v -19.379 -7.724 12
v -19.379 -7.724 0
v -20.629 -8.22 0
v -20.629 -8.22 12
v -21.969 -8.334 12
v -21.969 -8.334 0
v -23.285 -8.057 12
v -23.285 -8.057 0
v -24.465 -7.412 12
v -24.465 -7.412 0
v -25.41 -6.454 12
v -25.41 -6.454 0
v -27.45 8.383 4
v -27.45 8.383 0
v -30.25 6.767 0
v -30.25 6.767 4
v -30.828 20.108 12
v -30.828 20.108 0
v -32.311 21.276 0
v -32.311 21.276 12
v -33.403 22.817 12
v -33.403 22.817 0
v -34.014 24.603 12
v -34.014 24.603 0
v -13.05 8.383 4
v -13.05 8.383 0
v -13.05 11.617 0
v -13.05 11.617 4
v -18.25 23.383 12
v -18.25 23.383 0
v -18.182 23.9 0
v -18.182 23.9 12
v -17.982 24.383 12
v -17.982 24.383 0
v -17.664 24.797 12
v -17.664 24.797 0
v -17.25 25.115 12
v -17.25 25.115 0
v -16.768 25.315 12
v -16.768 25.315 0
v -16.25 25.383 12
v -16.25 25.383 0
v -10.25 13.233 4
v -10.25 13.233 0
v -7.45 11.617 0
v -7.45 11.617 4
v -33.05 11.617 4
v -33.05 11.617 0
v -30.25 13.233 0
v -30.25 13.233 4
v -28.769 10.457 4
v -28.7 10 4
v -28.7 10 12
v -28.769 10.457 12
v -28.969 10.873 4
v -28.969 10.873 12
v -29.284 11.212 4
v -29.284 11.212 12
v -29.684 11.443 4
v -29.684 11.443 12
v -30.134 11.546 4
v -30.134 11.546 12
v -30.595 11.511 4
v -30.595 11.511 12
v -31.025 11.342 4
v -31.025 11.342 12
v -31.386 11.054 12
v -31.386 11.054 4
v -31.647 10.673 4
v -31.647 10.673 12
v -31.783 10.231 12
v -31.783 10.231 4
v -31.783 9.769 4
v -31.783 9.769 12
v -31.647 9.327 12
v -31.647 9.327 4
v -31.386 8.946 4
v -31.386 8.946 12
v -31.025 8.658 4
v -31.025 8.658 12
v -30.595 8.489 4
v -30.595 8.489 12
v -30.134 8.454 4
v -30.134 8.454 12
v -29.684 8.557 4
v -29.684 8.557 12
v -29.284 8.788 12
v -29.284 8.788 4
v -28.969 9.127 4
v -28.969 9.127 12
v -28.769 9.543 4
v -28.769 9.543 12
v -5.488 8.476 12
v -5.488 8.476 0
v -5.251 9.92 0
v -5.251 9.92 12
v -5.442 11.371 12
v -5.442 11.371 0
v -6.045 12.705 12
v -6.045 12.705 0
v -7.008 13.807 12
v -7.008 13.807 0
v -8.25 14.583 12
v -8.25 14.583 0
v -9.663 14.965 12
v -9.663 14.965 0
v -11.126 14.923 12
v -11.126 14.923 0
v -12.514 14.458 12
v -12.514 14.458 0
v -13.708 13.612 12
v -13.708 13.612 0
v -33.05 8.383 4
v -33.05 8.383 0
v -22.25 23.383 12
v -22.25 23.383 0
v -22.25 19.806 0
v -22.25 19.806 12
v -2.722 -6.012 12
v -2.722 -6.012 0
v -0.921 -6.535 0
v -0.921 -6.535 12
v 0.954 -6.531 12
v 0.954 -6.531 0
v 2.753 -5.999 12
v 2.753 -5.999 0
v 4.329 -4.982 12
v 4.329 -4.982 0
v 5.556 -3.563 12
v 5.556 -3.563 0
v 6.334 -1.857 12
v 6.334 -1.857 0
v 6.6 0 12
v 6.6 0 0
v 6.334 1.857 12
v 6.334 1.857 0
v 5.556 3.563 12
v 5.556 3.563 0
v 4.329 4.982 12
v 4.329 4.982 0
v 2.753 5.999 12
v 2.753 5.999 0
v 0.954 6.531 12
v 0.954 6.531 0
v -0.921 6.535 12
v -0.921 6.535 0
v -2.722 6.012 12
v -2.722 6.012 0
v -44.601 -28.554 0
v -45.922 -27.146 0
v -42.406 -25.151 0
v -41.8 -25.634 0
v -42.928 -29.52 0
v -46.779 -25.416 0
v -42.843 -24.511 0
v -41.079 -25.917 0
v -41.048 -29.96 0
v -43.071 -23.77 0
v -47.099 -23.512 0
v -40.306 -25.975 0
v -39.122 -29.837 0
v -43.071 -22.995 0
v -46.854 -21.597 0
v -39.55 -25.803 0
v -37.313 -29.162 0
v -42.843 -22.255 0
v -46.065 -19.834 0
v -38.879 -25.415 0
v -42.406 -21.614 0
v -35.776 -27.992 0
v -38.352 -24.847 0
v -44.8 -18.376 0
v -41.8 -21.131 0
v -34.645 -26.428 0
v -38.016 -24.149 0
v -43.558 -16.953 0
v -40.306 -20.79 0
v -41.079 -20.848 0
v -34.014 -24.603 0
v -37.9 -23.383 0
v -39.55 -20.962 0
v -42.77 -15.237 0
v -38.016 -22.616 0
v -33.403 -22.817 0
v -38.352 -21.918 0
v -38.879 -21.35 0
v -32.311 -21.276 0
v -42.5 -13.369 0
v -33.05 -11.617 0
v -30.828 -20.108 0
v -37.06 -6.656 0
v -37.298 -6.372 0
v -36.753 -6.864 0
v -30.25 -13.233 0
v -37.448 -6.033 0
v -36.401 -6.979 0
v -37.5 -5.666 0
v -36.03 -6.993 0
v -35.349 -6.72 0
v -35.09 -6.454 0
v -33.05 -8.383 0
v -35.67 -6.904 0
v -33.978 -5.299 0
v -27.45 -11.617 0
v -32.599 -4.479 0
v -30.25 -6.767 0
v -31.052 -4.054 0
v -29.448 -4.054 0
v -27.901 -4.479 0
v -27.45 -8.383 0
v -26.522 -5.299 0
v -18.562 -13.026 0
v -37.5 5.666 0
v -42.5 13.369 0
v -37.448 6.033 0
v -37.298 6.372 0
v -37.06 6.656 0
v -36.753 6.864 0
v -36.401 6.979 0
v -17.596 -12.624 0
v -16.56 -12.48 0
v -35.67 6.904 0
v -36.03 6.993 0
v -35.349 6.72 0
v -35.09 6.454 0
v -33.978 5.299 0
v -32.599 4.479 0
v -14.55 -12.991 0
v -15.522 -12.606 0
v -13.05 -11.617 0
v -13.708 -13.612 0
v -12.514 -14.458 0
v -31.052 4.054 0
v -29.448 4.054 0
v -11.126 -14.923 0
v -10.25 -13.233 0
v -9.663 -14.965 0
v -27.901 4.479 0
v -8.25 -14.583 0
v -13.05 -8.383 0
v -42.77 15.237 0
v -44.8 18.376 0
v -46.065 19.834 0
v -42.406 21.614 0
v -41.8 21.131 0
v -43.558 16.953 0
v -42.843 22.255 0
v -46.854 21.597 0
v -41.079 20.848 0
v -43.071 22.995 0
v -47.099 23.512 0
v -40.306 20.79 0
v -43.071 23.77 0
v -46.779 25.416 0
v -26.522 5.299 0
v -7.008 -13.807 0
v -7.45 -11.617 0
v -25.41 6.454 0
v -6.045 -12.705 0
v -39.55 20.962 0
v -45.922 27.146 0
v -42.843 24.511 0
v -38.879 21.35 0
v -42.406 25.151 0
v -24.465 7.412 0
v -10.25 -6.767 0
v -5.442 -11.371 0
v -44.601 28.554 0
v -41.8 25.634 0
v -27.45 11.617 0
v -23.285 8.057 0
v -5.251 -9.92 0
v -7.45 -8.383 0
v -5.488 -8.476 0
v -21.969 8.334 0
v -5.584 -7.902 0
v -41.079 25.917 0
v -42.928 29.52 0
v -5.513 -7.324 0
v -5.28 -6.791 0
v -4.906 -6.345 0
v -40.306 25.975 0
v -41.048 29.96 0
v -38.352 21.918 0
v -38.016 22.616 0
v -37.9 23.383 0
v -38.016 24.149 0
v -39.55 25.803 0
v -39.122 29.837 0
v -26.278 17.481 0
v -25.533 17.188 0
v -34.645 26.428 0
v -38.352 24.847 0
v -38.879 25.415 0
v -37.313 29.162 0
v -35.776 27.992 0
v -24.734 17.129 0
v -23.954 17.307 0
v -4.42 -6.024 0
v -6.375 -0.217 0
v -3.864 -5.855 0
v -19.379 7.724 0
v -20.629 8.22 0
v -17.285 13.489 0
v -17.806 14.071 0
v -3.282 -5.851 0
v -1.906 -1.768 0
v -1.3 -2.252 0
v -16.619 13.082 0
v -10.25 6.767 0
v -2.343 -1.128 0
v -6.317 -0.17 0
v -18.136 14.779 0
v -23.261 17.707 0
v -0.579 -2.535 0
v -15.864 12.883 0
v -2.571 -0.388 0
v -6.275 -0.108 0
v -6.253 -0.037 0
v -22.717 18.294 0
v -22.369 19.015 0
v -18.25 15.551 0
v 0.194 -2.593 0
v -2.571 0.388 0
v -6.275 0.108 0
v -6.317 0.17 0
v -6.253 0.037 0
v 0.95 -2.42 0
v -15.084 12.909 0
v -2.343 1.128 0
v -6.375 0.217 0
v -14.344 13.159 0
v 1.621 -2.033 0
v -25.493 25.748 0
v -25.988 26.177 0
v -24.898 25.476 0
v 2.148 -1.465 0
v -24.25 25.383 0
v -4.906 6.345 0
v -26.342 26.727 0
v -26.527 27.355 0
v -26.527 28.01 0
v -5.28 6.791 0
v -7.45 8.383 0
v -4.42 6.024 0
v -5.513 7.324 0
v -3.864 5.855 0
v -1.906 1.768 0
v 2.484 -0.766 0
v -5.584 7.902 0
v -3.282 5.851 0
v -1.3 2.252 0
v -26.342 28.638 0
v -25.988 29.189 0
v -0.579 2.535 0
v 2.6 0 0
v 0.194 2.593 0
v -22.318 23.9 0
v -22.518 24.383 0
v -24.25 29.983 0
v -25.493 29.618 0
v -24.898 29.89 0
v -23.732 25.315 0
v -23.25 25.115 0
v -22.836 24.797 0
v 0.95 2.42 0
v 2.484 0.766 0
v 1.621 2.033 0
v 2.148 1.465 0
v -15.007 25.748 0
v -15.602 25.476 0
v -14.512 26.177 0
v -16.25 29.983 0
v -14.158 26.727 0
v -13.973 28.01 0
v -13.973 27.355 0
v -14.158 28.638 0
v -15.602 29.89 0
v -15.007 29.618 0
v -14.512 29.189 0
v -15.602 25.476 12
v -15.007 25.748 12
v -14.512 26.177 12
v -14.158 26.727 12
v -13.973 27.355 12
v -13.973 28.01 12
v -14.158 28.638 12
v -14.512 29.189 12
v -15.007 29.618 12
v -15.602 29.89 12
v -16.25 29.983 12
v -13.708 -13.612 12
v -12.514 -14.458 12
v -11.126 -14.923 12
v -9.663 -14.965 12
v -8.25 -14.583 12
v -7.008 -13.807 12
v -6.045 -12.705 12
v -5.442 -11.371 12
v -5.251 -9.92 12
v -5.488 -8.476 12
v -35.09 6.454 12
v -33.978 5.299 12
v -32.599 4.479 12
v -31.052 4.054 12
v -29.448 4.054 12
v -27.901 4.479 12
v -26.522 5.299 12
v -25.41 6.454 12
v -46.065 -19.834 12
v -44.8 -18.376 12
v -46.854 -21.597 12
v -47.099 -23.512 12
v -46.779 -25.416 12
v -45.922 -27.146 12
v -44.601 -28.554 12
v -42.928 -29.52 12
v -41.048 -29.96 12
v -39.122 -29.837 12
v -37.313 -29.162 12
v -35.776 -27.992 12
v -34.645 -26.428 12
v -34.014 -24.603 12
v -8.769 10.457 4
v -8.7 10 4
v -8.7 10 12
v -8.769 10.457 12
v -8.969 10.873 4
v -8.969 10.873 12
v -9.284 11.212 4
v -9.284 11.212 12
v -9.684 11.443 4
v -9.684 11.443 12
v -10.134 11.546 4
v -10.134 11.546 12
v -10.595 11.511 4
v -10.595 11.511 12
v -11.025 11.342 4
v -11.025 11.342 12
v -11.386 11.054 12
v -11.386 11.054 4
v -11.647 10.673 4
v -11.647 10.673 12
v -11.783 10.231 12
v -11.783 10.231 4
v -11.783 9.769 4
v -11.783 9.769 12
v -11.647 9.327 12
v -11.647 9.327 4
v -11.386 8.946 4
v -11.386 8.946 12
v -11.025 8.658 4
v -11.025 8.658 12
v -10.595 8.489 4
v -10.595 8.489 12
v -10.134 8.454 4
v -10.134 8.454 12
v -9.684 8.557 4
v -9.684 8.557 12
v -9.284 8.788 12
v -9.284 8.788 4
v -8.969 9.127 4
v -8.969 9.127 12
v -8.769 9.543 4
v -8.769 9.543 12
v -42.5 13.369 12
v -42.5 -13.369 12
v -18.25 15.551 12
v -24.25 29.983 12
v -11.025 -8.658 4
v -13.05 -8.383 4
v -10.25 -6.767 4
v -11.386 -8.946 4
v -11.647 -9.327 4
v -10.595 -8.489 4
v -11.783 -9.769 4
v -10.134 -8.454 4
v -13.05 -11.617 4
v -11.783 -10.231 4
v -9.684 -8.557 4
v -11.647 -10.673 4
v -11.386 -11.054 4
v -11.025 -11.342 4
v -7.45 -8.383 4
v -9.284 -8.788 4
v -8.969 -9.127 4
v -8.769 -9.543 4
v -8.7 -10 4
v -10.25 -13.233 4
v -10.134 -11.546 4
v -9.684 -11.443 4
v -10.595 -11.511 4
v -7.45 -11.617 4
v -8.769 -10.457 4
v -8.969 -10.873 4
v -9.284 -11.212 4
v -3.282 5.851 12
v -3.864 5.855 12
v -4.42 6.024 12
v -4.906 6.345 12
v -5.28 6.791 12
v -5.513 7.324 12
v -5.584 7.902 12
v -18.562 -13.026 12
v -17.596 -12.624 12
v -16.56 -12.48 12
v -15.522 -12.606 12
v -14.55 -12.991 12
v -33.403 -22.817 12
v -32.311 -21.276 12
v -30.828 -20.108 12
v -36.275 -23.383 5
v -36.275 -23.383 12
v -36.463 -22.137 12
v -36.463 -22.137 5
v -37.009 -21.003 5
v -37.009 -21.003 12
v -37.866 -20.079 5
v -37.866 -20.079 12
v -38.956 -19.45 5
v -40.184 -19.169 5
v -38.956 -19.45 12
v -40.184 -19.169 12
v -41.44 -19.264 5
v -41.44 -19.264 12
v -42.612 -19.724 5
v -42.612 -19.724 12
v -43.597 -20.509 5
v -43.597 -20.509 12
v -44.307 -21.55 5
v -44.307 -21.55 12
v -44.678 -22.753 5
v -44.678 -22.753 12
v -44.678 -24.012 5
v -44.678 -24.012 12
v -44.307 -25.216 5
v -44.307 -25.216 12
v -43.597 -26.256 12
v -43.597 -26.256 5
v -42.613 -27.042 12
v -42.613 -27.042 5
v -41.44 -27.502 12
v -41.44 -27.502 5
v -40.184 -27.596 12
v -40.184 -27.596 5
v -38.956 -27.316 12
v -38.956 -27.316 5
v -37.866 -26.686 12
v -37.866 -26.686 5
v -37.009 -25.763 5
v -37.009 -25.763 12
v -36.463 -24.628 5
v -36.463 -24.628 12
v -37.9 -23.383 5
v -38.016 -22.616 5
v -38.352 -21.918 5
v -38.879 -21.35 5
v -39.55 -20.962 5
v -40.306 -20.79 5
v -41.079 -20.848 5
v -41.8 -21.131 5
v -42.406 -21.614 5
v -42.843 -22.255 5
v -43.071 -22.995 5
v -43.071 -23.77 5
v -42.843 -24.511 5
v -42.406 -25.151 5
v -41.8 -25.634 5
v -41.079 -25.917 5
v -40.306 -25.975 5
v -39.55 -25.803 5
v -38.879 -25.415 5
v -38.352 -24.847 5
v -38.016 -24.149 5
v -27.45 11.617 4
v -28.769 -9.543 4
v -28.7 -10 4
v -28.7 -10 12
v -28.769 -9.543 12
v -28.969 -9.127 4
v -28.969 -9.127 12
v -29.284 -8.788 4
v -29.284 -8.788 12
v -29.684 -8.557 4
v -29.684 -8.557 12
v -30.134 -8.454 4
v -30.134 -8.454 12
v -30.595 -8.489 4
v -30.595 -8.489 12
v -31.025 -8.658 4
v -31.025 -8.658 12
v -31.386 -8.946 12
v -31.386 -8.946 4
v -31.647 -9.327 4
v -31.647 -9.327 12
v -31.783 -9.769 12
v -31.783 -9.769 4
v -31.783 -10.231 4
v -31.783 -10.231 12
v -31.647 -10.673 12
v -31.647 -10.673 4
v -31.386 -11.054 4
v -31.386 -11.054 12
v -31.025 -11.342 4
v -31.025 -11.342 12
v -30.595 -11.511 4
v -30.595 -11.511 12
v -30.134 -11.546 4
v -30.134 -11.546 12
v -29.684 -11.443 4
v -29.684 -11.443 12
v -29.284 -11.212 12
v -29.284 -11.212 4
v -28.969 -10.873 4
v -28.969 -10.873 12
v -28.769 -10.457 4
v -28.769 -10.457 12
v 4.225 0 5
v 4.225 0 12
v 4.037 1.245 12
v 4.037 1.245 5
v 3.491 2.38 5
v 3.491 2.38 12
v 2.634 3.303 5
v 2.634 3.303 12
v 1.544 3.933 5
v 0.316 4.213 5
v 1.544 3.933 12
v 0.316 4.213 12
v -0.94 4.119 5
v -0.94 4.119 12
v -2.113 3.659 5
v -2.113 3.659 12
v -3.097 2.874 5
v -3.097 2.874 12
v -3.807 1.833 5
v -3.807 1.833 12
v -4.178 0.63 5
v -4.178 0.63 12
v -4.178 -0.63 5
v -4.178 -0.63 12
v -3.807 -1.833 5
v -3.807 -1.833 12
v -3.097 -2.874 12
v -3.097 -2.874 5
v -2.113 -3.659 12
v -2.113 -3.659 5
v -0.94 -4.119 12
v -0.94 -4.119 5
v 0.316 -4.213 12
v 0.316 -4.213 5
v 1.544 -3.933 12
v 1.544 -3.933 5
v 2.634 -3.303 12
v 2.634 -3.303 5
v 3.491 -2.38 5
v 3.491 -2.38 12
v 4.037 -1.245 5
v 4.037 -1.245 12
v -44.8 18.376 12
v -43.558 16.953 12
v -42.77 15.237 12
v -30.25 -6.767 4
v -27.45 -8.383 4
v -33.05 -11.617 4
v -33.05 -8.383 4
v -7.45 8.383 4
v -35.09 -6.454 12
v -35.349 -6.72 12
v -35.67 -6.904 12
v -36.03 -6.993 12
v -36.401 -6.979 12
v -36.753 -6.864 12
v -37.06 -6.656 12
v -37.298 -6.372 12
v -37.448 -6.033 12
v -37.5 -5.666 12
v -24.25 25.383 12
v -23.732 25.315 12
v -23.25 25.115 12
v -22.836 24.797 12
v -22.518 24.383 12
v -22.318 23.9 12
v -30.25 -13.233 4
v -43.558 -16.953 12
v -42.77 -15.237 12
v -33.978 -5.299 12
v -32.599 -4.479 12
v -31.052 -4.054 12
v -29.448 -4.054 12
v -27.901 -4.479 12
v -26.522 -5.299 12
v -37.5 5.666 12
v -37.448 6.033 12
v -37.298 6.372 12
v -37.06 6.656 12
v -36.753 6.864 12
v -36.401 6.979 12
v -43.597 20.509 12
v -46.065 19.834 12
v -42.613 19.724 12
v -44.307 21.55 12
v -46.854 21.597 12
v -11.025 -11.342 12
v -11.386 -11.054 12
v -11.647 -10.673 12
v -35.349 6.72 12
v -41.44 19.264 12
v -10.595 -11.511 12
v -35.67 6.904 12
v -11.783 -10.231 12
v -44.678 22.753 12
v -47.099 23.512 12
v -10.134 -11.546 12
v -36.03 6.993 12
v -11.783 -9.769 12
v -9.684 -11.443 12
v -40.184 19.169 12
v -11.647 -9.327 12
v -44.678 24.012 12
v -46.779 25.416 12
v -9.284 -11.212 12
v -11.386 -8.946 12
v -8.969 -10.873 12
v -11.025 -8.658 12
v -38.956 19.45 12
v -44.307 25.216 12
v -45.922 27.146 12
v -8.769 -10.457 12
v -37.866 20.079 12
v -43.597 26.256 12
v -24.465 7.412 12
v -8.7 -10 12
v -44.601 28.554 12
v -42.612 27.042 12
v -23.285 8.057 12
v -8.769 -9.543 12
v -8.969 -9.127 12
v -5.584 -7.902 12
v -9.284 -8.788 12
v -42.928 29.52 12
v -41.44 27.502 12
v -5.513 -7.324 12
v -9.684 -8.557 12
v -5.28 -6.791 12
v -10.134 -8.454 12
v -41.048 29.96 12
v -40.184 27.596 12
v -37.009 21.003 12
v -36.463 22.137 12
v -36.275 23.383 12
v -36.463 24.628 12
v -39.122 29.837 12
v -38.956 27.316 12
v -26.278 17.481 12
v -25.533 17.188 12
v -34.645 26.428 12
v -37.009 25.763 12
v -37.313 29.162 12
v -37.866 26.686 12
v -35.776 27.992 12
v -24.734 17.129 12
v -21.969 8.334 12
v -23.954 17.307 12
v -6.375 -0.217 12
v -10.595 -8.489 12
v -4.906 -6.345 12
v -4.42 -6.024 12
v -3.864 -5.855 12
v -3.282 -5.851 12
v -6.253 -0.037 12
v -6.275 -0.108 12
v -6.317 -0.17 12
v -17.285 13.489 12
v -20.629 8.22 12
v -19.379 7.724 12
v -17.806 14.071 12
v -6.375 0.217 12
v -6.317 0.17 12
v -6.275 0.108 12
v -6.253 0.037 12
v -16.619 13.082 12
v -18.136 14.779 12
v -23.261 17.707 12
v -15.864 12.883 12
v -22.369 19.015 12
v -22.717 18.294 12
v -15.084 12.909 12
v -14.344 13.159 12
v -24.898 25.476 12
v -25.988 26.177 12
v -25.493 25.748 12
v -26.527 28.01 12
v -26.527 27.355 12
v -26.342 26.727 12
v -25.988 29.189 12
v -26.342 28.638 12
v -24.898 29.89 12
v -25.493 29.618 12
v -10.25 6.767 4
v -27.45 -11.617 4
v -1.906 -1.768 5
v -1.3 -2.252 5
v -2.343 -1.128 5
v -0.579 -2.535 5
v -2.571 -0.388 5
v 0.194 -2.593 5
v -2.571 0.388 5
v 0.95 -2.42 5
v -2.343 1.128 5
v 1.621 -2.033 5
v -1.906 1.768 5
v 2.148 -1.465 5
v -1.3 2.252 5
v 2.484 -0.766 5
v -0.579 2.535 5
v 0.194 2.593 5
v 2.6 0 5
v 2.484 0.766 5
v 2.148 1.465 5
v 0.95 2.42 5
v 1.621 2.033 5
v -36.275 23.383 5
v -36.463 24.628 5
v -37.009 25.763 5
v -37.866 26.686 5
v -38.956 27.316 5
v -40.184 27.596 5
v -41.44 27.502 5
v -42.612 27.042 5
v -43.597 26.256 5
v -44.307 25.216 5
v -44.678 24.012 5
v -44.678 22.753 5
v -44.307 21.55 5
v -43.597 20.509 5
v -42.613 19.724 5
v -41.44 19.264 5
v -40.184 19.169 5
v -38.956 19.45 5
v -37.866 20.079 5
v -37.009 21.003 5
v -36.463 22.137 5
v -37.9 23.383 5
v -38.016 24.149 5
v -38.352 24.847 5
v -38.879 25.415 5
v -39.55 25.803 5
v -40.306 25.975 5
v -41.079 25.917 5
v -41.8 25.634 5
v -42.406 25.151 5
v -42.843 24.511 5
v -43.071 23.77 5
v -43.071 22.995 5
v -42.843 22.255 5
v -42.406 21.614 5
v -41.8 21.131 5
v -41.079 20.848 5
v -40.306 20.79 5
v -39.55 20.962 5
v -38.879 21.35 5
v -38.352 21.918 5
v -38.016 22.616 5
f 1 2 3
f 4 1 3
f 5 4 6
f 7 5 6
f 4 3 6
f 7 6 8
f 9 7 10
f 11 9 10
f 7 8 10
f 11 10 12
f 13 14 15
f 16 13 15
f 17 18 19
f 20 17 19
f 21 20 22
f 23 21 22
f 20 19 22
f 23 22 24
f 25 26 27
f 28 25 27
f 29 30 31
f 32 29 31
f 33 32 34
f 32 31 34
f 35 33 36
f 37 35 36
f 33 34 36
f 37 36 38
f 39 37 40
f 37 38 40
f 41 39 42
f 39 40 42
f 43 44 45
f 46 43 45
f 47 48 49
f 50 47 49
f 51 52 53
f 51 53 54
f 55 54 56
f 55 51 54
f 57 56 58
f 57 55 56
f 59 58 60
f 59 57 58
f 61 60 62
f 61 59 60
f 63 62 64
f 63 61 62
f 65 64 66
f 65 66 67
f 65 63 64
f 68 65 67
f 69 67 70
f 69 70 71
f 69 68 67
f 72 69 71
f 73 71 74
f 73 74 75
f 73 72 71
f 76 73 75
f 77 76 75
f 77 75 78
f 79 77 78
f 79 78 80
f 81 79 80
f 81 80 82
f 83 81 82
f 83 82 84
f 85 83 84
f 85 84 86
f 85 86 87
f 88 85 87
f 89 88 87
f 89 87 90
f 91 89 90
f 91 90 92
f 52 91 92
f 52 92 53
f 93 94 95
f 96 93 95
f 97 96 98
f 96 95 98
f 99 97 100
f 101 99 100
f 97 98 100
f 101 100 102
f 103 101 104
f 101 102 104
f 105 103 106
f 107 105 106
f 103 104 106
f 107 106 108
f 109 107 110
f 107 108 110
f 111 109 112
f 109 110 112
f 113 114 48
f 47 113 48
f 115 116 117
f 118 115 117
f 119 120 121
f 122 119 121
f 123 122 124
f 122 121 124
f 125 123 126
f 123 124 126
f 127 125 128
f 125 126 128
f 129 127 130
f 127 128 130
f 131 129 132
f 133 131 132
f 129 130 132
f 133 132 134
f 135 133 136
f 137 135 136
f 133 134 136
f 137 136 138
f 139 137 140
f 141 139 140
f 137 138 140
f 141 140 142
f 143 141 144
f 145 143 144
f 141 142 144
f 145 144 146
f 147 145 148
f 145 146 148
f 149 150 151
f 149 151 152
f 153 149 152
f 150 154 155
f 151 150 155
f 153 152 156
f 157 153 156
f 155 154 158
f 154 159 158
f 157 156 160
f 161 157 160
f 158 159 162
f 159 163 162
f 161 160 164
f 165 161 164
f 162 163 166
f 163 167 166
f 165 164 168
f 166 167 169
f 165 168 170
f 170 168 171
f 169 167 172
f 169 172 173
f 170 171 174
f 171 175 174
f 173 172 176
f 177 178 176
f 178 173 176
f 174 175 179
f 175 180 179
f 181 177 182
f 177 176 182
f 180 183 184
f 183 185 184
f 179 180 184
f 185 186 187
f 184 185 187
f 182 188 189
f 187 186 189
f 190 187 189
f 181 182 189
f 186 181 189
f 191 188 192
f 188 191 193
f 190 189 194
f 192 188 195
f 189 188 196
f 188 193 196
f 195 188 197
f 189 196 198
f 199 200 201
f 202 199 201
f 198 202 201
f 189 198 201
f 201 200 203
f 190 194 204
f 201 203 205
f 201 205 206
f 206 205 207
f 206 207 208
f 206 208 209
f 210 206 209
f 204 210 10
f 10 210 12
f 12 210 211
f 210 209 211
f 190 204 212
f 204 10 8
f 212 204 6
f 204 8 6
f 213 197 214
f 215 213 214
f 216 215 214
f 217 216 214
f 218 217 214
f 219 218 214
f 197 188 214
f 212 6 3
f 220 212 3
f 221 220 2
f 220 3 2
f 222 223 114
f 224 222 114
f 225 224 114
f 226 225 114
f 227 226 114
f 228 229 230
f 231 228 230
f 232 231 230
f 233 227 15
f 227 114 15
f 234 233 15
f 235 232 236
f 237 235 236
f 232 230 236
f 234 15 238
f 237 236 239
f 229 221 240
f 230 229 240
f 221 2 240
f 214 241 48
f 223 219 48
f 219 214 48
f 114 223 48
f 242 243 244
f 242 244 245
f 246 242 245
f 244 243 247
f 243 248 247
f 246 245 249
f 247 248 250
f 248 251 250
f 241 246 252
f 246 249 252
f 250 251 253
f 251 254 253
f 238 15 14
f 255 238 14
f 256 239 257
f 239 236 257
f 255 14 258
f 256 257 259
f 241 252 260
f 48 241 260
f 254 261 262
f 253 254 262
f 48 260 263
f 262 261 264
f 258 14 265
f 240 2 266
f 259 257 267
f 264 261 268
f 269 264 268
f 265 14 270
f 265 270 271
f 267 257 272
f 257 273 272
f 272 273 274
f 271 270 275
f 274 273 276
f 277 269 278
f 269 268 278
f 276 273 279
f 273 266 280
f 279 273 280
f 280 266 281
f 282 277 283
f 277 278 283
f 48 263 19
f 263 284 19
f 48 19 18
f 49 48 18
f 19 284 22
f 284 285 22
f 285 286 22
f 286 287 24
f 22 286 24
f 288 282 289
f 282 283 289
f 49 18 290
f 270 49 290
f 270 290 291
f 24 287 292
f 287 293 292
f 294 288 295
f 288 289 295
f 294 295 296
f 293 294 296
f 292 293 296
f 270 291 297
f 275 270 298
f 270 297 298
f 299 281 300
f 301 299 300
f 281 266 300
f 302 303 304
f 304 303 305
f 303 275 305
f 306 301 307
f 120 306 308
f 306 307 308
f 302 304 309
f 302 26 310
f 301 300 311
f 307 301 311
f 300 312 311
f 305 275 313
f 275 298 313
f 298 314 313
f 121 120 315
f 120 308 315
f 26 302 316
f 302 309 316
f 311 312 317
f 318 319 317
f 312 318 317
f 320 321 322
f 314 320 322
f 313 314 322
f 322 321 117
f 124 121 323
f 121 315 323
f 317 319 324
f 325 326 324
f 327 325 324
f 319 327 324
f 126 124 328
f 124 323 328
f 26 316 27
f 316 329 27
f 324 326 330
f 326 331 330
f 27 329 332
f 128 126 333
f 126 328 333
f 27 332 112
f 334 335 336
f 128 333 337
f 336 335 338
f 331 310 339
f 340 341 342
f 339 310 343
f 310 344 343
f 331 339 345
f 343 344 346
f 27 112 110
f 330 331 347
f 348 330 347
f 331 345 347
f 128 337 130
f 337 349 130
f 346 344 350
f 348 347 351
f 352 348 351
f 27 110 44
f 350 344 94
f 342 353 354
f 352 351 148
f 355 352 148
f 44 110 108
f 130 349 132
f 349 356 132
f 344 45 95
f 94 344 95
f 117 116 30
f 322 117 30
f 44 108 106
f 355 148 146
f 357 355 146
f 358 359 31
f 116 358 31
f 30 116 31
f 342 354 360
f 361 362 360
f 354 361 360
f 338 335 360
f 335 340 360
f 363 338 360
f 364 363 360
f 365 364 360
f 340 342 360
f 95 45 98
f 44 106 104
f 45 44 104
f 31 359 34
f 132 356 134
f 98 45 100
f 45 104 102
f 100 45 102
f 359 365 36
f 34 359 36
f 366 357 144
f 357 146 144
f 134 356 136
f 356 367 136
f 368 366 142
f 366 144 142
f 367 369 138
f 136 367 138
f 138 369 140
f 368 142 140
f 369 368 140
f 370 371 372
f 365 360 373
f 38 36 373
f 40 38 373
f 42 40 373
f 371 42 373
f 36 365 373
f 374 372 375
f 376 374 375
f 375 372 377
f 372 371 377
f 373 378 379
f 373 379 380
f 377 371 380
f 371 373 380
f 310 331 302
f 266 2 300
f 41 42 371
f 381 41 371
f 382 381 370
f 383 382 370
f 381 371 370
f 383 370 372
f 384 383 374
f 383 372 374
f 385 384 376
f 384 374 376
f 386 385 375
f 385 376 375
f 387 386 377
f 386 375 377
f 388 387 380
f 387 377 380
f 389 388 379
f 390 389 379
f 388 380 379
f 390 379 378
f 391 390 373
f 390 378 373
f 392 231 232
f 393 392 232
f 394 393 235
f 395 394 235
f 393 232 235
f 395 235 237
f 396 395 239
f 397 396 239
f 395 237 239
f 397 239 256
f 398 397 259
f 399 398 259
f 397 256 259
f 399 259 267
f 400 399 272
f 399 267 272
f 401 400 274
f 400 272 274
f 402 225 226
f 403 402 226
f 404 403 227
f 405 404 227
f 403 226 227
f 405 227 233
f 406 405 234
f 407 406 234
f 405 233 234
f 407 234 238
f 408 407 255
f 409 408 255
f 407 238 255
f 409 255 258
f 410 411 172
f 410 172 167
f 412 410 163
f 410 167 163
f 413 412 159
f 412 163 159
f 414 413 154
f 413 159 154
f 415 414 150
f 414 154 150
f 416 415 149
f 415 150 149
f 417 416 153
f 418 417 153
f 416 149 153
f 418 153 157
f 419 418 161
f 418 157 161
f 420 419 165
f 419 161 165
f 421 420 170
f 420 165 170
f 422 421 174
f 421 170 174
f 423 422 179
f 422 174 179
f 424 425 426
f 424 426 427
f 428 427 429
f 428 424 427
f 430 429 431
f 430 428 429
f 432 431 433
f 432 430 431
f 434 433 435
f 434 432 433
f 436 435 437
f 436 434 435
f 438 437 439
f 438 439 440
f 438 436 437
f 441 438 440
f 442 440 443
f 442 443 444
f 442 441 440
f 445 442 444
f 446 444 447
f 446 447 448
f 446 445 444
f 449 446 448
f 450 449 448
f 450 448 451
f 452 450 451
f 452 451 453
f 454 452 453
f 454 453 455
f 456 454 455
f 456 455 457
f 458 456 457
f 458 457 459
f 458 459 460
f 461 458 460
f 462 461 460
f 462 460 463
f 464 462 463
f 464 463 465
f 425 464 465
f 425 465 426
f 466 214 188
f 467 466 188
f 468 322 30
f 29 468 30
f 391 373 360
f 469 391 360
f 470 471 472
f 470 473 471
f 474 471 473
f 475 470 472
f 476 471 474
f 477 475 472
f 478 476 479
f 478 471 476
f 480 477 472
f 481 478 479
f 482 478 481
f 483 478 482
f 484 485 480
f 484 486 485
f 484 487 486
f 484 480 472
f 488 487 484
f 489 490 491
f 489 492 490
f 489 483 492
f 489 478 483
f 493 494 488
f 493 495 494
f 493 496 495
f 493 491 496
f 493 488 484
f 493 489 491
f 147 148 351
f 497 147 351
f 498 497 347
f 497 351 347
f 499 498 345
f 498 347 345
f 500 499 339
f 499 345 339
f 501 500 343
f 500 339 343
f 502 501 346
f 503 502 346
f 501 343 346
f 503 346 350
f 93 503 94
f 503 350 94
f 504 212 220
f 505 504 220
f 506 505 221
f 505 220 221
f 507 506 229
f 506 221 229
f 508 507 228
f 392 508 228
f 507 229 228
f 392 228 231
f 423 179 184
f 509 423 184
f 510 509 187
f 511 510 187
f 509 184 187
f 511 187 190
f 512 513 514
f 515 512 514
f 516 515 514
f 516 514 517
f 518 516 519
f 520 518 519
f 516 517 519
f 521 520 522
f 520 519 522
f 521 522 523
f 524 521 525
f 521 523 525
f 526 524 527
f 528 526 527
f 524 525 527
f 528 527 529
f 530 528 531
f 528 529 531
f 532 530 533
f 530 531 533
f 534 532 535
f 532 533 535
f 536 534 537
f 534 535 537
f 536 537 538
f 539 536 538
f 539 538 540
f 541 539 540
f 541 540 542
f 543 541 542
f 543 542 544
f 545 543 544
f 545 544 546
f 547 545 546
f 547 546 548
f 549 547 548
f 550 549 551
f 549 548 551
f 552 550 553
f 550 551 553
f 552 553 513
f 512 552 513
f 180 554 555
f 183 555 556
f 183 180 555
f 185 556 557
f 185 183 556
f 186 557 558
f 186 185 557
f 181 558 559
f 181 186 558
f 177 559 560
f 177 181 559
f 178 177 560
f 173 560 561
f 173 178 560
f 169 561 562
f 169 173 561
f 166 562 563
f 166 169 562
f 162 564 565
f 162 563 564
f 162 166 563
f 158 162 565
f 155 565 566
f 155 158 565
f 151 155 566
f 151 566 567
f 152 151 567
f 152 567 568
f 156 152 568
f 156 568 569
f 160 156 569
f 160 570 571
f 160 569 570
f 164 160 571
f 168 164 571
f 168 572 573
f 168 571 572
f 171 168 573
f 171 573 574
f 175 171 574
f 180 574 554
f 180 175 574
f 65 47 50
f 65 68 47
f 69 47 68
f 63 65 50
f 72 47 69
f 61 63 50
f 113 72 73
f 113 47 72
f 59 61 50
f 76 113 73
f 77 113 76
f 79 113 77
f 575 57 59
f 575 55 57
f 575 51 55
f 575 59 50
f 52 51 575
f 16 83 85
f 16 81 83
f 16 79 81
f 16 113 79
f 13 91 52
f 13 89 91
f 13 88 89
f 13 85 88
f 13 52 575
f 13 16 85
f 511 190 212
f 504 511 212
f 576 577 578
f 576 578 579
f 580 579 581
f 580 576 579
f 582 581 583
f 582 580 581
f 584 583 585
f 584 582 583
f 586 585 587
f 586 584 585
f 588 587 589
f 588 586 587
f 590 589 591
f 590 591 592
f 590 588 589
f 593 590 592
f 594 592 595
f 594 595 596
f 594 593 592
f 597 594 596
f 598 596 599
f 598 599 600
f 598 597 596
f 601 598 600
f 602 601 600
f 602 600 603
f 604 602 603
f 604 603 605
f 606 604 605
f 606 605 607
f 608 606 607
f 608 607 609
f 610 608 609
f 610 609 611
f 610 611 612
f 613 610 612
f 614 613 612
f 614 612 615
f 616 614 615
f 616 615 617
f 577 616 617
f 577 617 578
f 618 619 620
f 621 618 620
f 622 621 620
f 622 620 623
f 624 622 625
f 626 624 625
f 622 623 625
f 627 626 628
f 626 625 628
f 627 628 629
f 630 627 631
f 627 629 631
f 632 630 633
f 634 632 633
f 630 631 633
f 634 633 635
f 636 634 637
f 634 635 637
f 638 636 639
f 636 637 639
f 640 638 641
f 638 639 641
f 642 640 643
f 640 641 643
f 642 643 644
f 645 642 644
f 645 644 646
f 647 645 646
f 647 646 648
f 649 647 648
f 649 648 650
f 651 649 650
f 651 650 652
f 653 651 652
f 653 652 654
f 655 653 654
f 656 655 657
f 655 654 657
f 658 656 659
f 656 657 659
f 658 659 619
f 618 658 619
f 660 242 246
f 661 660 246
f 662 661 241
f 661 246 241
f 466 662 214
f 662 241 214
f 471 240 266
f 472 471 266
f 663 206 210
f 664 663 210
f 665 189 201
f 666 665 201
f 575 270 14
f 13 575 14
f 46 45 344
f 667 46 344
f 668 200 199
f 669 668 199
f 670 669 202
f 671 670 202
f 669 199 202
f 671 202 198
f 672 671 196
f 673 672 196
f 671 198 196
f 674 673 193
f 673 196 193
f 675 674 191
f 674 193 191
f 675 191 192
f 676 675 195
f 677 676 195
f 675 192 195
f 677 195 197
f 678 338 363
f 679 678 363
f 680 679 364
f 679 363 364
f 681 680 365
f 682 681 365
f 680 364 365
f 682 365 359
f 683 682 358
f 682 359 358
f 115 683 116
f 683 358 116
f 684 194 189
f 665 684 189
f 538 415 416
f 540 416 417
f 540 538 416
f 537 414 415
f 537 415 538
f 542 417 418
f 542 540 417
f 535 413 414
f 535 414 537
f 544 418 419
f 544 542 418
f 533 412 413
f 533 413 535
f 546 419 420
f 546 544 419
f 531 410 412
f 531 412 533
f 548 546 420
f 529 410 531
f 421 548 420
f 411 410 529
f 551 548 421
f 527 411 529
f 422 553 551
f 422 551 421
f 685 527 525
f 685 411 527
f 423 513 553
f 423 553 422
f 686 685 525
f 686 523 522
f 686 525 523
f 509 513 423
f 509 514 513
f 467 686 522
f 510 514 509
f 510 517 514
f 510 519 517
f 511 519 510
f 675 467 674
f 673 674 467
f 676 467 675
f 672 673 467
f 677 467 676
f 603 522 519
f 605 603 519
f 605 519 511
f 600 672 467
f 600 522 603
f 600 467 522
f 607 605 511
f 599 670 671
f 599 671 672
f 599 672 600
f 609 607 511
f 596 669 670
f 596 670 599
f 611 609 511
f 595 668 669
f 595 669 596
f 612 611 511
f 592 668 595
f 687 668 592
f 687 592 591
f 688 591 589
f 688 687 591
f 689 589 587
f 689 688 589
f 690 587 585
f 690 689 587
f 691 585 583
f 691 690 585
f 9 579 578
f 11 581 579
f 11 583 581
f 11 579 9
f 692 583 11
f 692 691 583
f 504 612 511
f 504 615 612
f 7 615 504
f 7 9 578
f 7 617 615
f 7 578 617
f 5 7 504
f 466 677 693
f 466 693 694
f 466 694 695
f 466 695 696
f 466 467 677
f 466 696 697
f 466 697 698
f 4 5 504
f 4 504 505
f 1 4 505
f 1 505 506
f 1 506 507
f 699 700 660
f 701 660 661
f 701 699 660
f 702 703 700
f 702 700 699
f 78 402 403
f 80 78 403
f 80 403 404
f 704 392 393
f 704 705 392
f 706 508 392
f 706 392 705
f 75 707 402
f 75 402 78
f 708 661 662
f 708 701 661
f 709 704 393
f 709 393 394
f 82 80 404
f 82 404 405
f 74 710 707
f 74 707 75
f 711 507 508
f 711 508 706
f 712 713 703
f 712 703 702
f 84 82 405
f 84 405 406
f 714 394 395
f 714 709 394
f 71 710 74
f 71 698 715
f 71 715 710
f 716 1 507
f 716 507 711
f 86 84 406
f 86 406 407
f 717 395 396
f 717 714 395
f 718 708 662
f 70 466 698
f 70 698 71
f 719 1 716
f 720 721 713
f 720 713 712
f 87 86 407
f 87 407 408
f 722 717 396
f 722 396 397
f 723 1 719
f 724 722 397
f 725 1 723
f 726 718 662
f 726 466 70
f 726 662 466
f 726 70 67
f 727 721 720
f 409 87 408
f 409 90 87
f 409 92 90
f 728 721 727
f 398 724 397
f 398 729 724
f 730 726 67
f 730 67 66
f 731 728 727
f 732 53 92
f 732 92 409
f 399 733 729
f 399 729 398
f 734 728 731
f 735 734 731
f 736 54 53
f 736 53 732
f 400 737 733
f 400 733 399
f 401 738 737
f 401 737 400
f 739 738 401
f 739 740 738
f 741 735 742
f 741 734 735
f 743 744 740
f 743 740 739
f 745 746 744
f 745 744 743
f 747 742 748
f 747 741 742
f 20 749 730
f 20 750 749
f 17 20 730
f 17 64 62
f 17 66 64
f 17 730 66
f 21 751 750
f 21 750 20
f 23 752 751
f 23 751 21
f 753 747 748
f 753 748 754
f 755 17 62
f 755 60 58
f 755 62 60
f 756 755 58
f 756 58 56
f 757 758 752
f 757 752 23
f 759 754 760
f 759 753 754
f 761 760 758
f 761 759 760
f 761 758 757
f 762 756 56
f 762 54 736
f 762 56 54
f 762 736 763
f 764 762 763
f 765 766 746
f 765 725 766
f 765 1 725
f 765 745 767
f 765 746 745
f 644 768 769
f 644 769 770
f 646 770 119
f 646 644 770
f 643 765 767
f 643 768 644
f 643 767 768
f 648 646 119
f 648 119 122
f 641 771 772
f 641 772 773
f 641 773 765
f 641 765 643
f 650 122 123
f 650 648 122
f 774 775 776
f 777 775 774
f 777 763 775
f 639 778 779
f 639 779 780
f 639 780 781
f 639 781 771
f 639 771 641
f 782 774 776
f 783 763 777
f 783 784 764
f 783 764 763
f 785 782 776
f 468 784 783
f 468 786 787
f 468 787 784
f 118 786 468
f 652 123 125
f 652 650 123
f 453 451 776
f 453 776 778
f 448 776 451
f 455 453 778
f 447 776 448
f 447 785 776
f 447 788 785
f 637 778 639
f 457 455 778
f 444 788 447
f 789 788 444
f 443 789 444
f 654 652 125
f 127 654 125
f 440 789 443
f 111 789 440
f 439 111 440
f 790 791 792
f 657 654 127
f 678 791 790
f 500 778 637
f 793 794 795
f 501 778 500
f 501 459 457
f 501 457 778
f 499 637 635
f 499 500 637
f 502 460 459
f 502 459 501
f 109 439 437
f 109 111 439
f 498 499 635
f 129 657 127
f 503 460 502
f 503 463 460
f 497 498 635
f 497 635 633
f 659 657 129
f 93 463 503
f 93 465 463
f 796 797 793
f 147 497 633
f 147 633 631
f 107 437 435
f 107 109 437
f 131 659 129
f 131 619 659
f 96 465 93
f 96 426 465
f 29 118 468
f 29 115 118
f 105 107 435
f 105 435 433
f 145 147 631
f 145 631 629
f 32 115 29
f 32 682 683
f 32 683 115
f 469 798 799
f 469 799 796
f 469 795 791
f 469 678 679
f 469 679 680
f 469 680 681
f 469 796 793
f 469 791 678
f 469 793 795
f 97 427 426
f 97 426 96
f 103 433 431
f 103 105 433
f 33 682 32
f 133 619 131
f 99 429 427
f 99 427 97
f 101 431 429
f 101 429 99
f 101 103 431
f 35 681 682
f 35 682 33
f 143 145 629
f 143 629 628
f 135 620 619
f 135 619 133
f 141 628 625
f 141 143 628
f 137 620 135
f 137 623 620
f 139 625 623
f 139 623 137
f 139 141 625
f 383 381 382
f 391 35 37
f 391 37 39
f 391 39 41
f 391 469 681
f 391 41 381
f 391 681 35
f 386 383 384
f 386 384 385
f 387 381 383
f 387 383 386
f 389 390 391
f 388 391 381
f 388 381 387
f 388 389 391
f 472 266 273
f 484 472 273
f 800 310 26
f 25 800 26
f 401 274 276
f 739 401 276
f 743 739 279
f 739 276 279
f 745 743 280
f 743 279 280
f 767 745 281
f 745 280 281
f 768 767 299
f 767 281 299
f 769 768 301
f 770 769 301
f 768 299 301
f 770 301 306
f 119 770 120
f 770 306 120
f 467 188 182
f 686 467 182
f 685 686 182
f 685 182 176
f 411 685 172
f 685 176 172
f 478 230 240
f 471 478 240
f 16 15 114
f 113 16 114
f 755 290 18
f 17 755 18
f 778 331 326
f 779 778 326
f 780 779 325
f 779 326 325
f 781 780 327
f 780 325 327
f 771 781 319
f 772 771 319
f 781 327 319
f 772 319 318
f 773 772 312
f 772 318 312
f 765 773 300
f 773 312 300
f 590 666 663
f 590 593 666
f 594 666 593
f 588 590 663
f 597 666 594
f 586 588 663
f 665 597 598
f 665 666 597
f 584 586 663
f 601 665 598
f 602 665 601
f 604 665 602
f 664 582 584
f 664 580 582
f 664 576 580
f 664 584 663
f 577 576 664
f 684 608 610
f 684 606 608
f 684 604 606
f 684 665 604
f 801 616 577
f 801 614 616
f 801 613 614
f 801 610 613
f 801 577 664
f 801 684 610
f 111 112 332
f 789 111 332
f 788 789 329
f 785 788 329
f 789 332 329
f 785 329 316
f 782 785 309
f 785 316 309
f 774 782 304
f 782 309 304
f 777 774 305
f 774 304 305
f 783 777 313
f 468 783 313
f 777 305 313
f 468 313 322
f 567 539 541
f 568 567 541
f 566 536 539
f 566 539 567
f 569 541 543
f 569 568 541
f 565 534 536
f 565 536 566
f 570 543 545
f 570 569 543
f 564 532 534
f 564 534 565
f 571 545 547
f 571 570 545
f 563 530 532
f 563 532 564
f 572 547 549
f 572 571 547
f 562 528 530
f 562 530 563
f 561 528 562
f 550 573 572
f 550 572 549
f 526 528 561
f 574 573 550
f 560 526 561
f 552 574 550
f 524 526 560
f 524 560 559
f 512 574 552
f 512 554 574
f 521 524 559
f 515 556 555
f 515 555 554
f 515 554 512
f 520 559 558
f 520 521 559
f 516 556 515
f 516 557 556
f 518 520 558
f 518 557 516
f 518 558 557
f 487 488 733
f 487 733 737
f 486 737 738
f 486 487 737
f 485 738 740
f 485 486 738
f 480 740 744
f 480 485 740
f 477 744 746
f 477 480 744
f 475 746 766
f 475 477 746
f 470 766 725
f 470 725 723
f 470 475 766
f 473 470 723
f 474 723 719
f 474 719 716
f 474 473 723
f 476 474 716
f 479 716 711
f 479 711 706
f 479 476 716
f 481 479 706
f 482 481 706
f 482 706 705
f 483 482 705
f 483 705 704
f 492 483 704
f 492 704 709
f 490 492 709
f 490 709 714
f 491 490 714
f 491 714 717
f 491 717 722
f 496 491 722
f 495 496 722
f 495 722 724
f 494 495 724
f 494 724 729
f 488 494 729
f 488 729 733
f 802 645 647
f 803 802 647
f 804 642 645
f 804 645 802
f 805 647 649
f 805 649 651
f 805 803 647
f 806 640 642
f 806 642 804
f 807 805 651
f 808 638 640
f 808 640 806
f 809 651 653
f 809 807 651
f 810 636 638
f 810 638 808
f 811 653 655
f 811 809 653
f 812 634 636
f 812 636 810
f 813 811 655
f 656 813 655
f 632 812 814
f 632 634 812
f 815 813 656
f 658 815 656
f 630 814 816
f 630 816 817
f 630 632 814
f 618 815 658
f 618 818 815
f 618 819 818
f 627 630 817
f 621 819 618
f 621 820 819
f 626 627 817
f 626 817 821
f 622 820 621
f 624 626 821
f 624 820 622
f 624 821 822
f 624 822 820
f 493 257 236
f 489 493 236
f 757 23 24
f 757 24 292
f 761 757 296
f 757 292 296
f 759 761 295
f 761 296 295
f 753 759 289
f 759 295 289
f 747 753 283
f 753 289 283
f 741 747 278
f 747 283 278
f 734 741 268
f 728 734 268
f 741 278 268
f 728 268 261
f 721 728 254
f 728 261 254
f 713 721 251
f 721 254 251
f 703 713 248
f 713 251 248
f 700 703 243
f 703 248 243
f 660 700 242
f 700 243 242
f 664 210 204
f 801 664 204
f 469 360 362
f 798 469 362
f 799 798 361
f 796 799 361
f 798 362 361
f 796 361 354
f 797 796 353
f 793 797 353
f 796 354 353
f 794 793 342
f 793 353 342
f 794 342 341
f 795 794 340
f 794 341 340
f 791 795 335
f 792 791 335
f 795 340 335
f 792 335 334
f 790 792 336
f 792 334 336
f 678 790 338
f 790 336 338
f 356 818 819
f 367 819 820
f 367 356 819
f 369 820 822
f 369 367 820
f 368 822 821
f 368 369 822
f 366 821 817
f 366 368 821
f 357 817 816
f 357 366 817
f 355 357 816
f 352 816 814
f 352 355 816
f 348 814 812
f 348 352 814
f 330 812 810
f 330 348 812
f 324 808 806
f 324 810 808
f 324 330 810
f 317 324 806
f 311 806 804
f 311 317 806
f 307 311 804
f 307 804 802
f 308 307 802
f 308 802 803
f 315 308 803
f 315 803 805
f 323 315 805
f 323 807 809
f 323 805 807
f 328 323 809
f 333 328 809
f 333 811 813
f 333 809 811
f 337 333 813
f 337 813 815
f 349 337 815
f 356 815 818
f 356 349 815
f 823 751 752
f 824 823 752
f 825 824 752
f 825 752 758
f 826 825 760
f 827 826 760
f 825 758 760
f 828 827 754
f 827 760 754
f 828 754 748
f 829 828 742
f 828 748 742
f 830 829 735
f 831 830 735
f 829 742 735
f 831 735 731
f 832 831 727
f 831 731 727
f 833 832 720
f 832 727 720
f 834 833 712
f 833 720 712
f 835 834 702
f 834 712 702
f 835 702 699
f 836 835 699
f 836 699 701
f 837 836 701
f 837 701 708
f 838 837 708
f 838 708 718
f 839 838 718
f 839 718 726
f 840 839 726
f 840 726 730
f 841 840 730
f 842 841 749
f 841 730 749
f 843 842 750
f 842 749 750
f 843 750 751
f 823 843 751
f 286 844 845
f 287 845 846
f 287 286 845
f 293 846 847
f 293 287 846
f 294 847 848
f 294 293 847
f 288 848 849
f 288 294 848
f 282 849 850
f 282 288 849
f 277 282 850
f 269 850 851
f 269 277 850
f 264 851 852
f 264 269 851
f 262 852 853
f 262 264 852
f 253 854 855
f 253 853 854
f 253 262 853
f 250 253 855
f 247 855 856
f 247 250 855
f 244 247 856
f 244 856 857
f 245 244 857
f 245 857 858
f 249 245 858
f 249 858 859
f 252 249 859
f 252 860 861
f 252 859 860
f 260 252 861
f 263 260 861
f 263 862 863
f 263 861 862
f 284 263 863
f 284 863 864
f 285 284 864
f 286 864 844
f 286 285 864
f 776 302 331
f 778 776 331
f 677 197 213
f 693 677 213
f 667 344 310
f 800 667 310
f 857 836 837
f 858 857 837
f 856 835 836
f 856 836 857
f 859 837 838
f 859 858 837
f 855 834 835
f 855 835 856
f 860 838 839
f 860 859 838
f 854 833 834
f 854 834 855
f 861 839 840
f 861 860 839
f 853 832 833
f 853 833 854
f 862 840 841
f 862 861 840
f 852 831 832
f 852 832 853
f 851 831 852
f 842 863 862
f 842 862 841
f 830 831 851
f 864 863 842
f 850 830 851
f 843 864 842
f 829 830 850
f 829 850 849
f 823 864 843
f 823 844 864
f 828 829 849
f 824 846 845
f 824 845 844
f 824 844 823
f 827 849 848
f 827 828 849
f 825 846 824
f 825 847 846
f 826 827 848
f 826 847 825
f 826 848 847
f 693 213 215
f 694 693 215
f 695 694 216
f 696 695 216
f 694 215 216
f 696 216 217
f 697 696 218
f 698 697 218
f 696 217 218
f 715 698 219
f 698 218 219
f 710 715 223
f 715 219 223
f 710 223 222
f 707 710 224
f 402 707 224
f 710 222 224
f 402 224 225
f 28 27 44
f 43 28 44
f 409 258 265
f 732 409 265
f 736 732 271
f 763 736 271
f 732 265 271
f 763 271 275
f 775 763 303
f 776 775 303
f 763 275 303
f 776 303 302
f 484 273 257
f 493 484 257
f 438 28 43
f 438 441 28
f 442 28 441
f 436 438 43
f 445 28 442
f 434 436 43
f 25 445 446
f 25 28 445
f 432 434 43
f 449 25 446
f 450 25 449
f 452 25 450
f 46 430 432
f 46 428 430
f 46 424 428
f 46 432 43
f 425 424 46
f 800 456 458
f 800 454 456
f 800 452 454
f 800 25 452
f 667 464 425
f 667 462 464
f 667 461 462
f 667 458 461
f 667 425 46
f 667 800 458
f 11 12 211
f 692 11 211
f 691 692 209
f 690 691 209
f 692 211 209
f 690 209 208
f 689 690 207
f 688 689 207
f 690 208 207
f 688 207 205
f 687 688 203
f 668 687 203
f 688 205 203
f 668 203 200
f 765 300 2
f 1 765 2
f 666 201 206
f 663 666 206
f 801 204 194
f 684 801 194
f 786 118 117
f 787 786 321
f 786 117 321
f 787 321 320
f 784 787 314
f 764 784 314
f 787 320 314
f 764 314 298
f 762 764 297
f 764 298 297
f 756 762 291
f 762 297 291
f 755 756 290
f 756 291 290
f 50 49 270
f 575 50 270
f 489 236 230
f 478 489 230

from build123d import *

# Parameters (mm, degrees)
F0_R     = 2.6
F0_R_2   = 1.55
F1_DEPTH = 12
F2_R     = 4.225
F3_DEPTH = 7
F5_DEPTH = 4


with BuildPart() as f1:
    # F0 (on Top) → F1 (new body)
    with BuildSketch(Plane.XY):
        with BuildLine():
            ThreePointArc((-30.82763, 20.107742), (-32.912276, 22.00702), (-34.013815, 24.603098))
            ThreePointArc((-34.013815, 24.603098), (-43.8, 29.098454), (-44.8, 18.375691))
            ThreePointArc((-44.8, 18.375691), (-43.102501, 16.123691), (-42.5, 13.368696))
            Line((-42.5, 13.368696), (-42.5, -13.368696))
            ThreePointArc((-42.5, -13.368696), (-43.102501, -16.123691), (-44.8, -18.375691))
            ThreePointArc((-44.8, -18.375691), (-43.8, -29.098454), (-34.013815, -24.603098))
            ThreePointArc((-34.013815, -24.603098), (-32.912276, -22.00702), (-30.82763, -20.107742))
            Line((-30.82763, -20.107742), (-18.561811, -13.026067))
            ThreePointArc((-18.561811, -13.026067), (-16.037247, -12.509627), (-13.707877, -13.611522))
            ThreePointArc((-13.707877, -13.611522), (-7.600624, -14.240378), (-5.487994, -8.475762))
            ThreePointArc((-5.487994, -8.475762), (-4.905969, -6.345122), (-2.722478, -6.01233))
            ThreePointArc((-2.722478, -6.01233), (6.6, 0), (-2.722478, 6.01233))
            ThreePointArc((-2.722478, 6.01233), (-4.905969, 6.345122), (-5.487994, 8.475762))
            ThreePointArc((-5.487994, 8.475762), (-7.600624, 14.240378), (-13.707877, 13.611522))
            ThreePointArc((-13.707877, 13.611522), (-16.619309, 13.081574), (-18.25, 15.551013))
            Line((-18.25, 15.551013), (-18.25, 23.382686))
            ThreePointArc((-18.25, 23.382686), (-17.664214, 24.796899), (-16.25, 25.382686))
            ThreePointArc((-16.25, 25.382686), (-13.95, 27.682686), (-16.25, 29.982686))
            Line((-16.25, 29.982686), (-24.25, 29.982686))
            ThreePointArc((-24.25, 29.982686), (-26.55, 27.682686), (-24.25, 25.382686))
            ThreePointArc((-24.25, 25.382686), (-22.835786, 24.796899), (-22.25, 23.382686))
            Line((-22.25, 23.382686), (-22.25, 19.80625))
            ThreePointArc((-22.25, 19.80625), (-23.592572, 17.480847), (-26.277716, 17.480847))
            Line((-26.277716, 17.480847), (-30.82763, 20.107742))
        make_face()
        with Locations((-40.5, -23.382686)):
            Circle(F0_R, mode=Mode.SUBTRACT)
        with Locations((-30.25, -10)):
            Circle(F0_R_2, mode=Mode.SUBTRACT)
        with BuildLine():
            ThreePointArc((-25.409667, 6.454415), (-22.637088, 8.243459), (-19.37854, 7.724104))
            Line((-19.37854, 7.724104), (-6.375, 0.216506))
            ThreePointArc((-6.375, 0.216506), (-6.25, 0), (-6.375, -0.216506))
            Line((-6.375, -0.216506), (-19.37854, -7.724104))
            ThreePointArc((-19.37854, -7.724104), (-22.637088, -8.243459), (-25.409667, -6.454415))
            ThreePointArc((-25.409667, -6.454415), (-30.25, -4), (-35.090333, -6.454415))
            ThreePointArc((-35.090333, -6.454415), (-36.580889, -6.933918), (-37.5, -5.666277))
            Line((-37.5, -5.666277), (-37.5, 5.666277))
            ThreePointArc((-37.5, 5.666277), (-36.580889, 6.933918), (-35.090333, 6.454415))
            ThreePointArc((-35.090333, 6.454415), (-30.25, 4), (-25.409667, 6.454415))
        make_face(mode=Mode.SUBTRACT)
        with Locations((-10.25, -10)):
            Circle(F0_R_2, mode=Mode.SUBTRACT)
        Circle(F0_R, mode=Mode.SUBTRACT)
        with Locations((-30.25, 10)):
            Circle(F0_R_2, mode=Mode.SUBTRACT)
        with Locations((-40.5, 23.382686)):
            Circle(F0_R, mode=Mode.SUBTRACT)
        with Locations((-10.25, 10)):
            Circle(F0_R_2, mode=Mode.SUBTRACT)
    extrude(amount=F1_DEPTH)

    # F2 (on face) → F3 (cut)
    with BuildSketch(Plane.XY.offset(12)):
        with Locations((-40.5, 23.382686)):
            Circle(F2_R)
        Circle(F2_R)
        with Locations((-40.5, -23.382686)):
            Circle(F2_R)
    extrude(amount=-F3_DEPTH, mode=Mode.SUBTRACT)

    # F4 (on face) → F5 (cut)
    with BuildSketch(Plane(origin=(0, 0, 0), x_dir=(1, 0, 0), z_dir=(0, 0, -1))):
        Polygon((-27.45, 8.383419), (-27.45, 11.616581), (-30.25, 13.233162), (-33.05, 11.616581), (-33.05, 8.383419), (-30.25, 6.766838), align=None)
        Polygon((-27.45, -11.616581), (-27.45, -8.383419), (-30.25, -6.766838), (-33.05, -8.383419), (-33.05, -11.616581), (-30.25, -13.233162), align=None)
        Polygon((-13.05, -8.383419), (-13.05, -11.616581), (-10.25, -13.233162), (-7.45, -11.616581), (-7.45, -8.383419), (-10.25, -6.766838), align=None)
        Polygon((-13.05, 11.616581), (-13.05, 8.383419), (-10.25, 6.766838), (-7.45, 8.383419), (-7.45, 11.616581), (-10.25, 13.233162), align=None)
    extrude(amount=-F5_DEPTH, mode=Mode.SUBTRACT)


solid = f1.part
